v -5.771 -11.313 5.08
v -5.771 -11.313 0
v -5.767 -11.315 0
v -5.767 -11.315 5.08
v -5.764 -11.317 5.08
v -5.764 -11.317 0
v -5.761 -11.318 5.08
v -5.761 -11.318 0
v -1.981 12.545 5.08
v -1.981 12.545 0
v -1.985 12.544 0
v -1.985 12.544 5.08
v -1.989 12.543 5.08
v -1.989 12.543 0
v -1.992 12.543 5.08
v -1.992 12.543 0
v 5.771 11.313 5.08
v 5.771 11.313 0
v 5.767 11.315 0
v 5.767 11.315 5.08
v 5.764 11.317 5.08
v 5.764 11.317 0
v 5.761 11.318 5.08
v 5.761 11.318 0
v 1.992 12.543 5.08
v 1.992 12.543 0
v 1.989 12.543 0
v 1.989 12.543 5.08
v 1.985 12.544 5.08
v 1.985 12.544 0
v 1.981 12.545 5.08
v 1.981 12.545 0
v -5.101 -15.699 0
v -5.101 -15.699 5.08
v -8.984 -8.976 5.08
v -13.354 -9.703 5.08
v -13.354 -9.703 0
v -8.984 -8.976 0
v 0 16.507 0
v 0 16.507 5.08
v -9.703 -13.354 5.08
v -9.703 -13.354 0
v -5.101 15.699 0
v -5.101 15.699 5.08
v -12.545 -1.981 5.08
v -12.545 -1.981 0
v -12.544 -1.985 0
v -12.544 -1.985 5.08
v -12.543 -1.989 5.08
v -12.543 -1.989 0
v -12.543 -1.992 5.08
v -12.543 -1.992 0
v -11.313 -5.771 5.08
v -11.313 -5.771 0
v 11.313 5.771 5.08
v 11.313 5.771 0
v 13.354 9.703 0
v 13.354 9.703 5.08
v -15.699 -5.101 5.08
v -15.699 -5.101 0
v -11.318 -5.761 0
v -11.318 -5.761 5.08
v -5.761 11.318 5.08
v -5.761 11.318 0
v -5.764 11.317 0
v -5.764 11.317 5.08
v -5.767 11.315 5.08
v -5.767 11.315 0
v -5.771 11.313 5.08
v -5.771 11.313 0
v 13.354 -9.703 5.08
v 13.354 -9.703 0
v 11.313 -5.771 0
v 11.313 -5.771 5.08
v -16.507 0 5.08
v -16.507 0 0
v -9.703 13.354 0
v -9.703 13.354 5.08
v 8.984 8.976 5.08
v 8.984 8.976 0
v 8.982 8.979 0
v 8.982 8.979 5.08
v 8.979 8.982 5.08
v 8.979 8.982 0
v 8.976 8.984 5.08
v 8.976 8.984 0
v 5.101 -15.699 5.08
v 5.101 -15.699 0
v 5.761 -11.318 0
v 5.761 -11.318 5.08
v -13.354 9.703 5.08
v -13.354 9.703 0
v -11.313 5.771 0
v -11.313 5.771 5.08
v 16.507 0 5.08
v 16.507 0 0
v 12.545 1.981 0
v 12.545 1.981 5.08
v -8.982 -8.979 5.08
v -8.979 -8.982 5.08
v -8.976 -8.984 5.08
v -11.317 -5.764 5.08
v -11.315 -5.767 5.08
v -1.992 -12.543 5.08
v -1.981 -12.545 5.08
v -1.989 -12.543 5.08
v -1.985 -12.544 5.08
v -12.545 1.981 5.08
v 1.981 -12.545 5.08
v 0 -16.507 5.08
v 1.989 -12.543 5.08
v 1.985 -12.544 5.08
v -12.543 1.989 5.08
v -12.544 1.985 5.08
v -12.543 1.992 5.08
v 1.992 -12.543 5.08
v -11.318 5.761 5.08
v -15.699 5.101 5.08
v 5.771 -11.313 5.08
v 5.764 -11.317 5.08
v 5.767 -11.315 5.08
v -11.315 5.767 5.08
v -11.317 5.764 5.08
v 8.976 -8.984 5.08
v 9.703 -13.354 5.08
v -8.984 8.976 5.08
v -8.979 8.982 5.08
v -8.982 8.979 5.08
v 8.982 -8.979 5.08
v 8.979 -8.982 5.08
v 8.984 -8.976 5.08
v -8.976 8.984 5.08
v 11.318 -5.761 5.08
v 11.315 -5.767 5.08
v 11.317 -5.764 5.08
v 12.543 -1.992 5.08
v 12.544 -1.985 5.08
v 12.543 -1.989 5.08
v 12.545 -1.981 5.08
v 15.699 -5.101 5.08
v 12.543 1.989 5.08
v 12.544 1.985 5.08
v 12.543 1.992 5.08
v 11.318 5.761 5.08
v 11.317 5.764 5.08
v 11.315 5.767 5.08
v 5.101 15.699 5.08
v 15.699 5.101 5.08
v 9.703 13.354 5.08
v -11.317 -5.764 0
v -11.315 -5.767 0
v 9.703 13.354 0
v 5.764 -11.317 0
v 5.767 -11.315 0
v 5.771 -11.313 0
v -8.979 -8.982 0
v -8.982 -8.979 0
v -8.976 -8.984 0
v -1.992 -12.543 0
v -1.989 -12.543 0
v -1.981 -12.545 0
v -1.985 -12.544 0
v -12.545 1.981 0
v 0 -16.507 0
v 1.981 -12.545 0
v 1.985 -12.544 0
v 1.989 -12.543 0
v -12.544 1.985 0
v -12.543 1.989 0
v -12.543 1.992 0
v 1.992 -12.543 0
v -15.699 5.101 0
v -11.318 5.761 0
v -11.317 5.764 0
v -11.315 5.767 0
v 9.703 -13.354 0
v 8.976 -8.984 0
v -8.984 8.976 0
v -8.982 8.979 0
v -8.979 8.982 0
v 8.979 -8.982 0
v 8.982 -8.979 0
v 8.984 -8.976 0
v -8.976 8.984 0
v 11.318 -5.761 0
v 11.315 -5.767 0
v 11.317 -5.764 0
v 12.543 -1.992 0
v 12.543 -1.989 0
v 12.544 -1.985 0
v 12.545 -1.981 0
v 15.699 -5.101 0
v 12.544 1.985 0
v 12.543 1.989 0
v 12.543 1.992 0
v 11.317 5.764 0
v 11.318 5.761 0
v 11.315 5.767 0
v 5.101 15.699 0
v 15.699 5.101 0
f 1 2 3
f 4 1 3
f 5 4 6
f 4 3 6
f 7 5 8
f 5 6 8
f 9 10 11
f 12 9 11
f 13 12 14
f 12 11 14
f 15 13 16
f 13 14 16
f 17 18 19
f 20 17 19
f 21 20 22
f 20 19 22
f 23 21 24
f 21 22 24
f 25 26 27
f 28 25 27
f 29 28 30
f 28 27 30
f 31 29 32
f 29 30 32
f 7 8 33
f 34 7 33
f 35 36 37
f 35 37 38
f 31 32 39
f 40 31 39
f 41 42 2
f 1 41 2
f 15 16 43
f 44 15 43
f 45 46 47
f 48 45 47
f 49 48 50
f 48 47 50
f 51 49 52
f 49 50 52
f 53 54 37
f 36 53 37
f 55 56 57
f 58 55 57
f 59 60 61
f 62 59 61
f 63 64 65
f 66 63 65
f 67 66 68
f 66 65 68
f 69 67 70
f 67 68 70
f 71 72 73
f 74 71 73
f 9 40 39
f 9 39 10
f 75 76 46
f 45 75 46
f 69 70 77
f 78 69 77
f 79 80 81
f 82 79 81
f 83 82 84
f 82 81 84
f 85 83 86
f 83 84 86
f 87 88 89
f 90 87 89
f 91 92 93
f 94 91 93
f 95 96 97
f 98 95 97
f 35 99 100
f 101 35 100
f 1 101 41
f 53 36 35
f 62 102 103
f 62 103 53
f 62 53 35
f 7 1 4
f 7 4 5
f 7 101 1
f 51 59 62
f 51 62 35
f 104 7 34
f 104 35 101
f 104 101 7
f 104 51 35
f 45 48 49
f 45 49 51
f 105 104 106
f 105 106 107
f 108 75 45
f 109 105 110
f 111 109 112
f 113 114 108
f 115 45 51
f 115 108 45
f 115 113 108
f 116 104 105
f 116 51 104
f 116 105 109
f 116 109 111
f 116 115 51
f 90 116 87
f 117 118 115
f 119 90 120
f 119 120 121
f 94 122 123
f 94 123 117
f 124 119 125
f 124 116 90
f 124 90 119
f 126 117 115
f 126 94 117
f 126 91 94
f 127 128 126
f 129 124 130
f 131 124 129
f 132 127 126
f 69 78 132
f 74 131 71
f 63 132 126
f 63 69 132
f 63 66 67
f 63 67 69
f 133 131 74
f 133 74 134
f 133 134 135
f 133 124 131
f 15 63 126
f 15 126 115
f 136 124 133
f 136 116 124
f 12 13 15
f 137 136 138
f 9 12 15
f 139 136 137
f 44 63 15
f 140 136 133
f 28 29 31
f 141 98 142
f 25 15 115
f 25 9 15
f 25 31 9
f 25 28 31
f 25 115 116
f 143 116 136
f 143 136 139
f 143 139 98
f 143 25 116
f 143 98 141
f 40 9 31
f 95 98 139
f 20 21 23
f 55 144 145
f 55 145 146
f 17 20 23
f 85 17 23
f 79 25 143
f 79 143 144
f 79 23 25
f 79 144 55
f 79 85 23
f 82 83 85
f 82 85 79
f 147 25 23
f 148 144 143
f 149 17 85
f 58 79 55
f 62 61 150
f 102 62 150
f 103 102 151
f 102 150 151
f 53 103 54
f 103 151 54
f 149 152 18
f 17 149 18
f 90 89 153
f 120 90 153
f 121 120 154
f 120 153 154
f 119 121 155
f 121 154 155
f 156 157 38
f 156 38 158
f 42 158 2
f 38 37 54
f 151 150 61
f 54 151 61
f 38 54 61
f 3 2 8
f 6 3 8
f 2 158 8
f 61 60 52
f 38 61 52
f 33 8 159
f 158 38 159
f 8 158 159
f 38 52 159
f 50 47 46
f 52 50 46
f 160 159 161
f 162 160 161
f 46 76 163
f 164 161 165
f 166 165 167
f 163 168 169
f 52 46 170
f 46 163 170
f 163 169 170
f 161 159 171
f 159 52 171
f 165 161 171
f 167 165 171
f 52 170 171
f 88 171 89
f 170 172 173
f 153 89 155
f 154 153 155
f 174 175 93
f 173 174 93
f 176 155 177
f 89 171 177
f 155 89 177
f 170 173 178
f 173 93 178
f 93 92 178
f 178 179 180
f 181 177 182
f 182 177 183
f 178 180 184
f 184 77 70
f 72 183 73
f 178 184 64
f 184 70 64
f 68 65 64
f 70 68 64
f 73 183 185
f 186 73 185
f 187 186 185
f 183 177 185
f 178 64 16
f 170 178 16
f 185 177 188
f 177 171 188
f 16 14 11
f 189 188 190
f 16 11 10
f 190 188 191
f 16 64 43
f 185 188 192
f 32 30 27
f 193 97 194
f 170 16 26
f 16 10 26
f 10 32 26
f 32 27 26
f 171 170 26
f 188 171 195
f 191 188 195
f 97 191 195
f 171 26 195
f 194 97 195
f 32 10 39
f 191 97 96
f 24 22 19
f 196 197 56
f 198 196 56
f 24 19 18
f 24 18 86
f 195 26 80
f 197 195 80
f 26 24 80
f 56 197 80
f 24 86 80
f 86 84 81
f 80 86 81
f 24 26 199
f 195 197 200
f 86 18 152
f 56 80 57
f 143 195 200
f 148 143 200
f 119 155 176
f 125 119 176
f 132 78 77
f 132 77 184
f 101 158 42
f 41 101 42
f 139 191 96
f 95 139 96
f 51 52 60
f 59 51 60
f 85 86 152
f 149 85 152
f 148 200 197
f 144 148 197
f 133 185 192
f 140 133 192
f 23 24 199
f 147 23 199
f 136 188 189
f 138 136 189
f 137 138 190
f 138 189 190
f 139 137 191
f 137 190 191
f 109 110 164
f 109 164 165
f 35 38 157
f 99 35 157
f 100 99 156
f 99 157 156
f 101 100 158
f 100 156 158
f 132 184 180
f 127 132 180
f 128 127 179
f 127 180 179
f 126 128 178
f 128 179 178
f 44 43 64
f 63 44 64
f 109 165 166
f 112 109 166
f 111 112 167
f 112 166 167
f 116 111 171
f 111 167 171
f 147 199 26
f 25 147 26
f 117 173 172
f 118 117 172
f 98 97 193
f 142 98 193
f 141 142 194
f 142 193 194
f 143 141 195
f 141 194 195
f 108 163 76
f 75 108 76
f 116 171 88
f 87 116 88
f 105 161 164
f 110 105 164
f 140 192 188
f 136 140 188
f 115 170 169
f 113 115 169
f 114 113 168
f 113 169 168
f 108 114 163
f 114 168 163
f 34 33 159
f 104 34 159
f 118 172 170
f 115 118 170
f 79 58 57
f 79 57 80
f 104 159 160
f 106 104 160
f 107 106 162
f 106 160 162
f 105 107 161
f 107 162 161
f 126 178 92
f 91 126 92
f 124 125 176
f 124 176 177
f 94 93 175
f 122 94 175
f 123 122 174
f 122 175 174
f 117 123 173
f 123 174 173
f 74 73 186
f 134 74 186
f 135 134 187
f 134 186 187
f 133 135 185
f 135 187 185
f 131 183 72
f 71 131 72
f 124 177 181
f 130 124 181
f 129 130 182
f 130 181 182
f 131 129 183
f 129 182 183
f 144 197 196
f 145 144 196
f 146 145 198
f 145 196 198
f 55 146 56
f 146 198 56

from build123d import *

# Parameters (mm, degrees)
F0_R     = 11.43
F0_R_2   = 5.08
F0_R_3   = 3.81
F1_DEPTH = 5.08


with BuildPart() as f1:
    # F0 (on Top) → F1 (new body)
    with BuildSketch(Plane.XY):
        with BuildLine():
            ThreePointArc((12.5445146004, -1.9812), (12.6610689799, -0.9936459568), (12.7, 0))
            ThreePointArc((12.7, 0), (12.6610689799, 0.9936459568), (12.5445146004, 1.9812))
            ThreePointArc((12.5445146004, 1.9812), (12.5436419256, 1.986717706), (12.5427668237, 1.9922350276))
            ThreePointArc((12.5427668237, 1.9922350276), (12.0784177569, 3.9245158286), (11.3183178852, 5.7607013678))
            ThreePointArc((11.3183178852, 5.7607013678), (11.3157828572, 5.7656793467), (11.3132456398, 5.77065621))
            ThreePointArc((11.3132456398, 5.77065621), (10.2745158286, 7.4648727041), (8.9842053561, 8.9763051485))
            ThreePointArc((8.9842053561, 8.9763051485), (8.9802561211, 8.9802561211), (8.9763051485, 8.9842053561))
            ThreePointArc((8.9763051485, 8.9842053561), (7.4648727041, 10.2745158286), (5.77065621, 11.3132456398))
            ThreePointArc((5.77065621, 11.3132456398), (5.7656793467, 11.3157828572), (5.7607013678, 11.3183178852))
            ThreePointArc((5.7607013678, 11.3183178852), (3.9245158286, 12.0784177569), (1.9922350276, 12.5427668237))
            ThreePointArc((1.9922350276, 12.5427668237), (1.986717706, 12.5436419256), (1.9812, 12.5445146004))
            ThreePointArc((1.9812, 12.5445146004), (0, 12.7), (-1.9812, 12.5445146004))
            ThreePointArc((-1.9812, 12.5445146004), (-1.986717706, 12.5436419256), (-1.9922350276, 12.5427668237))
            ThreePointArc((-1.9922350276, 12.5427668237), (-3.9245158286, 12.0784177569), (-5.7607013678, 11.3183178852))
            ThreePointArc((-5.7607013678, 11.3183178852), (-5.7656793467, 11.3157828572), (-5.77065621, 11.3132456398))
            ThreePointArc((-5.77065621, 11.3132456398), (-7.4648727041, 10.2745158286), (-8.9763051485, 8.9842053561))
            ThreePointArc((-8.9763051485, 8.9842053561), (-8.9802561211, 8.9802561211), (-8.9842053561, 8.9763051485))
            ThreePointArc((-8.9842053561, 8.9763051485), (-10.2745158286, 7.4648727041), (-11.3132456398, 5.77065621))
            ThreePointArc((-11.3132456398, 5.77065621), (-11.3157828572, 5.7656793467), (-11.3183178852, 5.7607013678))
            ThreePointArc((-11.3183178852, 5.7607013678), (-12.0784177569, 3.9245158286), (-12.5427668237, 1.9922350276))
            ThreePointArc((-12.5427668237, 1.9922350276), (-12.5436419256, 1.986717706), (-12.5445146004, 1.9812))
            Line((-12.5445146004, 1.9812), (-12.5445146004, 0))
            Line((-12.5445146004, 0), (-12.5445146004, -1.9812))
            ThreePointArc((-12.5445146004, -1.9812), (-12.5436419256, -1.986717706), (-12.5427668237, -1.9922350276))
            ThreePointArc((-12.5427668237, -1.9922350276), (-12.0784177569, -3.9245158286), (-11.3183178852, -5.7607013678))
            ThreePointArc((-11.3183178852, -5.7607013678), (-11.3157828572, -5.7656793467), (-11.3132456398, -5.77065621))
            ThreePointArc((-11.3132456398, -5.77065621), (-10.2745158286, -7.4648727041), (-8.9842053561, -8.9763051485))
            ThreePointArc((-8.9842053561, -8.9763051485), (-8.9802561211, -8.9802561211), (-8.9763051485, -8.9842053561))
            ThreePointArc((-8.9763051485, -8.9842053561), (-7.4648727041, -10.2745158286), (-5.77065621, -11.3132456398))
            ThreePointArc((-5.77065621, -11.3132456398), (-5.7656793467, -11.3157828572), (-5.7607013678, -11.3183178852))
            ThreePointArc((-5.7607013678, -11.3183178852), (-3.9245158286, -12.0784177569), (-1.9922350276, -12.5427668237))
            ThreePointArc((-1.9922350276, -12.5427668237), (-1.986717706, -12.5436419256), (-1.9812, -12.5445146004))
            ThreePointArc((-1.9812, -12.5445146004), (0, -12.7), (1.9812, -12.5445146004))
            ThreePointArc((1.9812, -12.5445146004), (1.986717706, -12.5436419256), (1.9922350276, -12.5427668237))
            ThreePointArc((1.9922350276, -12.5427668237), (3.9245158286, -12.0784177569), (5.7607013678, -11.3183178852))
            ThreePointArc((5.7607013678, -11.3183178852), (5.7656793467, -11.3157828572), (5.77065621, -11.3132456398))
            ThreePointArc((5.77065621, -11.3132456398), (7.4648727041, -10.2745158286), (8.9763051485, -8.9842053561))
            ThreePointArc((8.9763051485, -8.9842053561), (8.9802561211, -8.9802561211), (8.9842053561, -8.9763051485))
            ThreePointArc((8.9842053561, -8.9763051485), (10.2745158286, -7.4648727041), (11.3132456398, -5.77065621))
            ThreePointArc((11.3132456398, -5.77065621), (11.3157828572, -5.7656793467), (11.3183178852, -5.7607013678))
            ThreePointArc((11.3183178852, -5.7607013678), (12.0784177569, -3.9245158286), (12.5427668237, -1.9922350276))
            ThreePointArc((12.5427668237, -1.9922350276), (12.5436419256, -1.986717706), (12.5445146004, -1.9812))
        make_face()
        Circle(F0_R, mode=Mode.SUBTRACT)
        Circle(F0_R)
        Circle(F0_R_2, mode=Mode.SUBTRACT)
        Circle(F0_R_2)
        Circle(F0_R_3, mode=Mode.SUBTRACT)
        Circle(F0_R_3)
        with BuildLine():
            ThreePointArc((12.5445146004, 1.9812), (12.6610689799, 0.9936459568), (12.7, 0))
            ThreePointArc((12.7, 0), (12.6610689799, -0.9936459568), (12.5445146004, -1.9812))
            Line((12.5445146004, -1.9812), (16.5069146004, 0))
            Line((16.5069146004, 0), (12.5445146004, 1.9812))
        make_face()
        with BuildLine():
            ThreePointArc((11.3183178852, 5.7607013678), (12.0784177569, 3.9245158286), (12.5427668237, 1.9922350276))
            Line((12.5427668237, 1.9922350276), (15.6990086947, 5.1009171362))
            Line((15.6990086947, 5.1009171362), (11.3183178852, 5.7607013678))
        make_face()
        with BuildLine():
            Line((15.6990086947, -5.1009171362), (12.5427668237, -1.9922350276))
            ThreePointArc((12.5427668237, -1.9922350276), (12.0784177569, -3.9245158286), (11.3183178852, -5.7607013678))
            Line((11.3183178852, -5.7607013678), (15.6990086947, -5.1009171362))
        make_face()
        with BuildLine():
            ThreePointArc((8.9842053561, 8.9763051485), (10.2745158286, 7.4648727041), (11.3132456398, 5.77065621))
            Line((11.3132456398, 5.77065621), (13.3543744364, 9.702520963))
            Line((13.3543744364, 9.702520963), (8.9842053561, 8.9763051485))
        make_face()
        with BuildLine():
            Line((13.3543744364, -9.702520963), (11.3132456398, -5.77065621))
            ThreePointArc((11.3132456398, -5.77065621), (10.2745158286, -7.4648727041), (8.9842053561, -8.9763051485))
            Line((8.9842053561, -8.9763051485), (13.3543744364, -9.702520963))
        make_face()
        with BuildLine():
            ThreePointArc((5.77065621, 11.3132456398), (7.4648727041, 10.2745158286), (8.9763051485, 8.9842053561))
            Line((8.9763051485, 8.9842053561), (9.702520963, 13.3543744364))
            Line((9.702520963, 13.3543744364), (5.77065621, 11.3132456398))
        make_face()
        with BuildLine():
            Line((9.702520963, -13.3543744364), (8.9763051485, -8.9842053561))
            ThreePointArc((8.9763051485, -8.9842053561), (7.4648727041, -10.2745158286), (5.77065621, -11.3132456398))
            Line((5.77065621, -11.3132456398), (9.702520963, -13.3543744364))
        make_face()
        with BuildLine():
            ThreePointArc((1.9922350276, 12.5427668237), (3.9245158286, 12.0784177569), (5.7607013678, 11.3183178852))
            Line((5.7607013678, 11.3183178852), (5.1009171362, 15.6990086947))
            Line((5.1009171362, 15.6990086947), (1.9922350276, 12.5427668237))
        make_face()
        with BuildLine():
            Line((5.1009171362, -15.6990086947), (5.7607013678, -11.3183178852))
            ThreePointArc((5.7607013678, -11.3183178852), (3.9245158286, -12.0784177569), (1.9922350276, -12.5427668237))
            Line((1.9922350276, -12.5427668237), (5.1009171362, -15.6990086947))
        make_face()
        with BuildLine():
            ThreePointArc((-1.9812, 12.5445146004), (0, 12.7), (1.9812, 12.5445146004))
            Line((1.9812, 12.5445146004), (0, 16.5069146004))
            Line((0, 16.5069146004), (-1.9812, 12.5445146004))
        make_face()
        with BuildLine():
            Line((0, -16.5069146004), (1.9812, -12.5445146004))
            ThreePointArc((1.9812, -12.5445146004), (0, -12.7), (-1.9812, -12.5445146004))
            Line((-1.9812, -12.5445146004), (0, -16.5069146004))
        make_face()
        with BuildLine():
            ThreePointArc((-5.7607013678, 11.3183178852), (-3.9245158286, 12.0784177569), (-1.9922350276, 12.5427668237))
            Line((-1.9922350276, 12.5427668237), (-5.1009171362, 15.6990086947))
            Line((-5.1009171362, 15.6990086947), (-5.7607013678, 11.3183178852))
        make_face()
        with BuildLine():
            Line((-5.1009171362, -15.6990086947), (-1.9922350276, -12.5427668237))
            ThreePointArc((-1.9922350276, -12.5427668237), (-3.9245158286, -12.0784177569), (-5.7607013678, -11.3183178852))
            Line((-5.7607013678, -11.3183178852), (-5.1009171362, -15.6990086947))
        make_face()
        with BuildLine():
            ThreePointArc((-8.9763051485, 8.9842053561), (-7.4648727041, 10.2745158286), (-5.77065621, 11.3132456398))
            Line((-5.77065621, 11.3132456398), (-9.702520963, 13.3543744364))
            Line((-9.702520963, 13.3543744364), (-8.9763051485, 8.9842053561))
        make_face()
        with BuildLine():
            Line((-9.702520963, -13.3543744364), (-5.77065621, -11.3132456398))
            ThreePointArc((-5.77065621, -11.3132456398), (-7.4648727041, -10.2745158286), (-8.9763051485, -8.9842053561))
            Line((-8.9763051485, -8.9842053561), (-9.702520963, -13.3543744364))
        make_face()
        with BuildLine():
            ThreePointArc((-11.3132456398, 5.77065621), (-10.2745158286, 7.4648727041), (-8.9842053561, 8.9763051485))
            Line((-8.9842053561, 8.9763051485), (-13.3543744364, 9.702520963))
            Line((-13.3543744364, 9.702520963), (-11.3132456398, 5.77065621))
        make_face()
        with BuildLine():
            Line((-13.3543744364, -9.702520963), (-8.9842053561, -8.9763051485))
            ThreePointArc((-8.9842053561, -8.9763051485), (-10.2745158286, -7.4648727041), (-11.3132456398, -5.77065621))
            Line((-11.3132456398, -5.77065621), (-13.3543744364, -9.702520963))
        make_face()
        with BuildLine():
            ThreePointArc((-12.5427668237, 1.9922350276), (-12.0784177569, 3.9245158286), (-11.3183178852, 5.7607013678))
            Line((-11.3183178852, 5.7607013678), (-15.6990086947, 5.1009171362))
            Line((-15.6990086947, 5.1009171362), (-12.5427668237, 1.9922350276))
        make_face()
        with BuildLine():
            Line((-15.6990086947, -5.1009171362), (-11.3183178852, -5.7607013678))
            ThreePointArc((-11.3183178852, -5.7607013678), (-12.0784177569, -3.9245158286), (-12.5427668237, -1.9922350276))
            Line((-12.5427668237, -1.9922350276), (-15.6990086947, -5.1009171362))
        make_face()
        with BuildLine():
            ThreePointArc((-12.7, 0), (-12.6610689799, 0.9936459568), (-12.5445146004, 1.9812))
            Line((-12.5445146004, 1.9812), (-16.5069146004, 0))
            Line((-16.5069146004, 0), (-12.7, 0))
        make_face()
        with BuildLine():
            Line((-16.5069146004, 0), (-12.5445146004, -1.9812))
            ThreePointArc((-12.5445146004, -1.9812), (-12.6610689799, -0.9936459568), (-12.7, 0))
            Line((-12.7, 0), (-16.5069146004, 0))
        make_face()
        with BuildLine():
            Line((-12.5445146004, 0), (-12.5445146004, 1.9812))
            ThreePointArc((-12.5445146004, 1.9812), (-12.6610689799, 0.9936459568), (-12.7, 0))
            Line((-12.7, 0), (-12.5445146004, 0))
        make_face()
        with BuildLine():
            ThreePointArc((-12.7, 0), (-12.6610689799, -0.9936459568), (-12.5445146004, -1.9812))
            Line((-12.5445146004, -1.9812), (-12.5445146004, 0))
            Line((-12.5445146004, 0), (-12.7, 0))
        make_face()
    extrude(amount=F1_DEPTH)


solid = f1.part
